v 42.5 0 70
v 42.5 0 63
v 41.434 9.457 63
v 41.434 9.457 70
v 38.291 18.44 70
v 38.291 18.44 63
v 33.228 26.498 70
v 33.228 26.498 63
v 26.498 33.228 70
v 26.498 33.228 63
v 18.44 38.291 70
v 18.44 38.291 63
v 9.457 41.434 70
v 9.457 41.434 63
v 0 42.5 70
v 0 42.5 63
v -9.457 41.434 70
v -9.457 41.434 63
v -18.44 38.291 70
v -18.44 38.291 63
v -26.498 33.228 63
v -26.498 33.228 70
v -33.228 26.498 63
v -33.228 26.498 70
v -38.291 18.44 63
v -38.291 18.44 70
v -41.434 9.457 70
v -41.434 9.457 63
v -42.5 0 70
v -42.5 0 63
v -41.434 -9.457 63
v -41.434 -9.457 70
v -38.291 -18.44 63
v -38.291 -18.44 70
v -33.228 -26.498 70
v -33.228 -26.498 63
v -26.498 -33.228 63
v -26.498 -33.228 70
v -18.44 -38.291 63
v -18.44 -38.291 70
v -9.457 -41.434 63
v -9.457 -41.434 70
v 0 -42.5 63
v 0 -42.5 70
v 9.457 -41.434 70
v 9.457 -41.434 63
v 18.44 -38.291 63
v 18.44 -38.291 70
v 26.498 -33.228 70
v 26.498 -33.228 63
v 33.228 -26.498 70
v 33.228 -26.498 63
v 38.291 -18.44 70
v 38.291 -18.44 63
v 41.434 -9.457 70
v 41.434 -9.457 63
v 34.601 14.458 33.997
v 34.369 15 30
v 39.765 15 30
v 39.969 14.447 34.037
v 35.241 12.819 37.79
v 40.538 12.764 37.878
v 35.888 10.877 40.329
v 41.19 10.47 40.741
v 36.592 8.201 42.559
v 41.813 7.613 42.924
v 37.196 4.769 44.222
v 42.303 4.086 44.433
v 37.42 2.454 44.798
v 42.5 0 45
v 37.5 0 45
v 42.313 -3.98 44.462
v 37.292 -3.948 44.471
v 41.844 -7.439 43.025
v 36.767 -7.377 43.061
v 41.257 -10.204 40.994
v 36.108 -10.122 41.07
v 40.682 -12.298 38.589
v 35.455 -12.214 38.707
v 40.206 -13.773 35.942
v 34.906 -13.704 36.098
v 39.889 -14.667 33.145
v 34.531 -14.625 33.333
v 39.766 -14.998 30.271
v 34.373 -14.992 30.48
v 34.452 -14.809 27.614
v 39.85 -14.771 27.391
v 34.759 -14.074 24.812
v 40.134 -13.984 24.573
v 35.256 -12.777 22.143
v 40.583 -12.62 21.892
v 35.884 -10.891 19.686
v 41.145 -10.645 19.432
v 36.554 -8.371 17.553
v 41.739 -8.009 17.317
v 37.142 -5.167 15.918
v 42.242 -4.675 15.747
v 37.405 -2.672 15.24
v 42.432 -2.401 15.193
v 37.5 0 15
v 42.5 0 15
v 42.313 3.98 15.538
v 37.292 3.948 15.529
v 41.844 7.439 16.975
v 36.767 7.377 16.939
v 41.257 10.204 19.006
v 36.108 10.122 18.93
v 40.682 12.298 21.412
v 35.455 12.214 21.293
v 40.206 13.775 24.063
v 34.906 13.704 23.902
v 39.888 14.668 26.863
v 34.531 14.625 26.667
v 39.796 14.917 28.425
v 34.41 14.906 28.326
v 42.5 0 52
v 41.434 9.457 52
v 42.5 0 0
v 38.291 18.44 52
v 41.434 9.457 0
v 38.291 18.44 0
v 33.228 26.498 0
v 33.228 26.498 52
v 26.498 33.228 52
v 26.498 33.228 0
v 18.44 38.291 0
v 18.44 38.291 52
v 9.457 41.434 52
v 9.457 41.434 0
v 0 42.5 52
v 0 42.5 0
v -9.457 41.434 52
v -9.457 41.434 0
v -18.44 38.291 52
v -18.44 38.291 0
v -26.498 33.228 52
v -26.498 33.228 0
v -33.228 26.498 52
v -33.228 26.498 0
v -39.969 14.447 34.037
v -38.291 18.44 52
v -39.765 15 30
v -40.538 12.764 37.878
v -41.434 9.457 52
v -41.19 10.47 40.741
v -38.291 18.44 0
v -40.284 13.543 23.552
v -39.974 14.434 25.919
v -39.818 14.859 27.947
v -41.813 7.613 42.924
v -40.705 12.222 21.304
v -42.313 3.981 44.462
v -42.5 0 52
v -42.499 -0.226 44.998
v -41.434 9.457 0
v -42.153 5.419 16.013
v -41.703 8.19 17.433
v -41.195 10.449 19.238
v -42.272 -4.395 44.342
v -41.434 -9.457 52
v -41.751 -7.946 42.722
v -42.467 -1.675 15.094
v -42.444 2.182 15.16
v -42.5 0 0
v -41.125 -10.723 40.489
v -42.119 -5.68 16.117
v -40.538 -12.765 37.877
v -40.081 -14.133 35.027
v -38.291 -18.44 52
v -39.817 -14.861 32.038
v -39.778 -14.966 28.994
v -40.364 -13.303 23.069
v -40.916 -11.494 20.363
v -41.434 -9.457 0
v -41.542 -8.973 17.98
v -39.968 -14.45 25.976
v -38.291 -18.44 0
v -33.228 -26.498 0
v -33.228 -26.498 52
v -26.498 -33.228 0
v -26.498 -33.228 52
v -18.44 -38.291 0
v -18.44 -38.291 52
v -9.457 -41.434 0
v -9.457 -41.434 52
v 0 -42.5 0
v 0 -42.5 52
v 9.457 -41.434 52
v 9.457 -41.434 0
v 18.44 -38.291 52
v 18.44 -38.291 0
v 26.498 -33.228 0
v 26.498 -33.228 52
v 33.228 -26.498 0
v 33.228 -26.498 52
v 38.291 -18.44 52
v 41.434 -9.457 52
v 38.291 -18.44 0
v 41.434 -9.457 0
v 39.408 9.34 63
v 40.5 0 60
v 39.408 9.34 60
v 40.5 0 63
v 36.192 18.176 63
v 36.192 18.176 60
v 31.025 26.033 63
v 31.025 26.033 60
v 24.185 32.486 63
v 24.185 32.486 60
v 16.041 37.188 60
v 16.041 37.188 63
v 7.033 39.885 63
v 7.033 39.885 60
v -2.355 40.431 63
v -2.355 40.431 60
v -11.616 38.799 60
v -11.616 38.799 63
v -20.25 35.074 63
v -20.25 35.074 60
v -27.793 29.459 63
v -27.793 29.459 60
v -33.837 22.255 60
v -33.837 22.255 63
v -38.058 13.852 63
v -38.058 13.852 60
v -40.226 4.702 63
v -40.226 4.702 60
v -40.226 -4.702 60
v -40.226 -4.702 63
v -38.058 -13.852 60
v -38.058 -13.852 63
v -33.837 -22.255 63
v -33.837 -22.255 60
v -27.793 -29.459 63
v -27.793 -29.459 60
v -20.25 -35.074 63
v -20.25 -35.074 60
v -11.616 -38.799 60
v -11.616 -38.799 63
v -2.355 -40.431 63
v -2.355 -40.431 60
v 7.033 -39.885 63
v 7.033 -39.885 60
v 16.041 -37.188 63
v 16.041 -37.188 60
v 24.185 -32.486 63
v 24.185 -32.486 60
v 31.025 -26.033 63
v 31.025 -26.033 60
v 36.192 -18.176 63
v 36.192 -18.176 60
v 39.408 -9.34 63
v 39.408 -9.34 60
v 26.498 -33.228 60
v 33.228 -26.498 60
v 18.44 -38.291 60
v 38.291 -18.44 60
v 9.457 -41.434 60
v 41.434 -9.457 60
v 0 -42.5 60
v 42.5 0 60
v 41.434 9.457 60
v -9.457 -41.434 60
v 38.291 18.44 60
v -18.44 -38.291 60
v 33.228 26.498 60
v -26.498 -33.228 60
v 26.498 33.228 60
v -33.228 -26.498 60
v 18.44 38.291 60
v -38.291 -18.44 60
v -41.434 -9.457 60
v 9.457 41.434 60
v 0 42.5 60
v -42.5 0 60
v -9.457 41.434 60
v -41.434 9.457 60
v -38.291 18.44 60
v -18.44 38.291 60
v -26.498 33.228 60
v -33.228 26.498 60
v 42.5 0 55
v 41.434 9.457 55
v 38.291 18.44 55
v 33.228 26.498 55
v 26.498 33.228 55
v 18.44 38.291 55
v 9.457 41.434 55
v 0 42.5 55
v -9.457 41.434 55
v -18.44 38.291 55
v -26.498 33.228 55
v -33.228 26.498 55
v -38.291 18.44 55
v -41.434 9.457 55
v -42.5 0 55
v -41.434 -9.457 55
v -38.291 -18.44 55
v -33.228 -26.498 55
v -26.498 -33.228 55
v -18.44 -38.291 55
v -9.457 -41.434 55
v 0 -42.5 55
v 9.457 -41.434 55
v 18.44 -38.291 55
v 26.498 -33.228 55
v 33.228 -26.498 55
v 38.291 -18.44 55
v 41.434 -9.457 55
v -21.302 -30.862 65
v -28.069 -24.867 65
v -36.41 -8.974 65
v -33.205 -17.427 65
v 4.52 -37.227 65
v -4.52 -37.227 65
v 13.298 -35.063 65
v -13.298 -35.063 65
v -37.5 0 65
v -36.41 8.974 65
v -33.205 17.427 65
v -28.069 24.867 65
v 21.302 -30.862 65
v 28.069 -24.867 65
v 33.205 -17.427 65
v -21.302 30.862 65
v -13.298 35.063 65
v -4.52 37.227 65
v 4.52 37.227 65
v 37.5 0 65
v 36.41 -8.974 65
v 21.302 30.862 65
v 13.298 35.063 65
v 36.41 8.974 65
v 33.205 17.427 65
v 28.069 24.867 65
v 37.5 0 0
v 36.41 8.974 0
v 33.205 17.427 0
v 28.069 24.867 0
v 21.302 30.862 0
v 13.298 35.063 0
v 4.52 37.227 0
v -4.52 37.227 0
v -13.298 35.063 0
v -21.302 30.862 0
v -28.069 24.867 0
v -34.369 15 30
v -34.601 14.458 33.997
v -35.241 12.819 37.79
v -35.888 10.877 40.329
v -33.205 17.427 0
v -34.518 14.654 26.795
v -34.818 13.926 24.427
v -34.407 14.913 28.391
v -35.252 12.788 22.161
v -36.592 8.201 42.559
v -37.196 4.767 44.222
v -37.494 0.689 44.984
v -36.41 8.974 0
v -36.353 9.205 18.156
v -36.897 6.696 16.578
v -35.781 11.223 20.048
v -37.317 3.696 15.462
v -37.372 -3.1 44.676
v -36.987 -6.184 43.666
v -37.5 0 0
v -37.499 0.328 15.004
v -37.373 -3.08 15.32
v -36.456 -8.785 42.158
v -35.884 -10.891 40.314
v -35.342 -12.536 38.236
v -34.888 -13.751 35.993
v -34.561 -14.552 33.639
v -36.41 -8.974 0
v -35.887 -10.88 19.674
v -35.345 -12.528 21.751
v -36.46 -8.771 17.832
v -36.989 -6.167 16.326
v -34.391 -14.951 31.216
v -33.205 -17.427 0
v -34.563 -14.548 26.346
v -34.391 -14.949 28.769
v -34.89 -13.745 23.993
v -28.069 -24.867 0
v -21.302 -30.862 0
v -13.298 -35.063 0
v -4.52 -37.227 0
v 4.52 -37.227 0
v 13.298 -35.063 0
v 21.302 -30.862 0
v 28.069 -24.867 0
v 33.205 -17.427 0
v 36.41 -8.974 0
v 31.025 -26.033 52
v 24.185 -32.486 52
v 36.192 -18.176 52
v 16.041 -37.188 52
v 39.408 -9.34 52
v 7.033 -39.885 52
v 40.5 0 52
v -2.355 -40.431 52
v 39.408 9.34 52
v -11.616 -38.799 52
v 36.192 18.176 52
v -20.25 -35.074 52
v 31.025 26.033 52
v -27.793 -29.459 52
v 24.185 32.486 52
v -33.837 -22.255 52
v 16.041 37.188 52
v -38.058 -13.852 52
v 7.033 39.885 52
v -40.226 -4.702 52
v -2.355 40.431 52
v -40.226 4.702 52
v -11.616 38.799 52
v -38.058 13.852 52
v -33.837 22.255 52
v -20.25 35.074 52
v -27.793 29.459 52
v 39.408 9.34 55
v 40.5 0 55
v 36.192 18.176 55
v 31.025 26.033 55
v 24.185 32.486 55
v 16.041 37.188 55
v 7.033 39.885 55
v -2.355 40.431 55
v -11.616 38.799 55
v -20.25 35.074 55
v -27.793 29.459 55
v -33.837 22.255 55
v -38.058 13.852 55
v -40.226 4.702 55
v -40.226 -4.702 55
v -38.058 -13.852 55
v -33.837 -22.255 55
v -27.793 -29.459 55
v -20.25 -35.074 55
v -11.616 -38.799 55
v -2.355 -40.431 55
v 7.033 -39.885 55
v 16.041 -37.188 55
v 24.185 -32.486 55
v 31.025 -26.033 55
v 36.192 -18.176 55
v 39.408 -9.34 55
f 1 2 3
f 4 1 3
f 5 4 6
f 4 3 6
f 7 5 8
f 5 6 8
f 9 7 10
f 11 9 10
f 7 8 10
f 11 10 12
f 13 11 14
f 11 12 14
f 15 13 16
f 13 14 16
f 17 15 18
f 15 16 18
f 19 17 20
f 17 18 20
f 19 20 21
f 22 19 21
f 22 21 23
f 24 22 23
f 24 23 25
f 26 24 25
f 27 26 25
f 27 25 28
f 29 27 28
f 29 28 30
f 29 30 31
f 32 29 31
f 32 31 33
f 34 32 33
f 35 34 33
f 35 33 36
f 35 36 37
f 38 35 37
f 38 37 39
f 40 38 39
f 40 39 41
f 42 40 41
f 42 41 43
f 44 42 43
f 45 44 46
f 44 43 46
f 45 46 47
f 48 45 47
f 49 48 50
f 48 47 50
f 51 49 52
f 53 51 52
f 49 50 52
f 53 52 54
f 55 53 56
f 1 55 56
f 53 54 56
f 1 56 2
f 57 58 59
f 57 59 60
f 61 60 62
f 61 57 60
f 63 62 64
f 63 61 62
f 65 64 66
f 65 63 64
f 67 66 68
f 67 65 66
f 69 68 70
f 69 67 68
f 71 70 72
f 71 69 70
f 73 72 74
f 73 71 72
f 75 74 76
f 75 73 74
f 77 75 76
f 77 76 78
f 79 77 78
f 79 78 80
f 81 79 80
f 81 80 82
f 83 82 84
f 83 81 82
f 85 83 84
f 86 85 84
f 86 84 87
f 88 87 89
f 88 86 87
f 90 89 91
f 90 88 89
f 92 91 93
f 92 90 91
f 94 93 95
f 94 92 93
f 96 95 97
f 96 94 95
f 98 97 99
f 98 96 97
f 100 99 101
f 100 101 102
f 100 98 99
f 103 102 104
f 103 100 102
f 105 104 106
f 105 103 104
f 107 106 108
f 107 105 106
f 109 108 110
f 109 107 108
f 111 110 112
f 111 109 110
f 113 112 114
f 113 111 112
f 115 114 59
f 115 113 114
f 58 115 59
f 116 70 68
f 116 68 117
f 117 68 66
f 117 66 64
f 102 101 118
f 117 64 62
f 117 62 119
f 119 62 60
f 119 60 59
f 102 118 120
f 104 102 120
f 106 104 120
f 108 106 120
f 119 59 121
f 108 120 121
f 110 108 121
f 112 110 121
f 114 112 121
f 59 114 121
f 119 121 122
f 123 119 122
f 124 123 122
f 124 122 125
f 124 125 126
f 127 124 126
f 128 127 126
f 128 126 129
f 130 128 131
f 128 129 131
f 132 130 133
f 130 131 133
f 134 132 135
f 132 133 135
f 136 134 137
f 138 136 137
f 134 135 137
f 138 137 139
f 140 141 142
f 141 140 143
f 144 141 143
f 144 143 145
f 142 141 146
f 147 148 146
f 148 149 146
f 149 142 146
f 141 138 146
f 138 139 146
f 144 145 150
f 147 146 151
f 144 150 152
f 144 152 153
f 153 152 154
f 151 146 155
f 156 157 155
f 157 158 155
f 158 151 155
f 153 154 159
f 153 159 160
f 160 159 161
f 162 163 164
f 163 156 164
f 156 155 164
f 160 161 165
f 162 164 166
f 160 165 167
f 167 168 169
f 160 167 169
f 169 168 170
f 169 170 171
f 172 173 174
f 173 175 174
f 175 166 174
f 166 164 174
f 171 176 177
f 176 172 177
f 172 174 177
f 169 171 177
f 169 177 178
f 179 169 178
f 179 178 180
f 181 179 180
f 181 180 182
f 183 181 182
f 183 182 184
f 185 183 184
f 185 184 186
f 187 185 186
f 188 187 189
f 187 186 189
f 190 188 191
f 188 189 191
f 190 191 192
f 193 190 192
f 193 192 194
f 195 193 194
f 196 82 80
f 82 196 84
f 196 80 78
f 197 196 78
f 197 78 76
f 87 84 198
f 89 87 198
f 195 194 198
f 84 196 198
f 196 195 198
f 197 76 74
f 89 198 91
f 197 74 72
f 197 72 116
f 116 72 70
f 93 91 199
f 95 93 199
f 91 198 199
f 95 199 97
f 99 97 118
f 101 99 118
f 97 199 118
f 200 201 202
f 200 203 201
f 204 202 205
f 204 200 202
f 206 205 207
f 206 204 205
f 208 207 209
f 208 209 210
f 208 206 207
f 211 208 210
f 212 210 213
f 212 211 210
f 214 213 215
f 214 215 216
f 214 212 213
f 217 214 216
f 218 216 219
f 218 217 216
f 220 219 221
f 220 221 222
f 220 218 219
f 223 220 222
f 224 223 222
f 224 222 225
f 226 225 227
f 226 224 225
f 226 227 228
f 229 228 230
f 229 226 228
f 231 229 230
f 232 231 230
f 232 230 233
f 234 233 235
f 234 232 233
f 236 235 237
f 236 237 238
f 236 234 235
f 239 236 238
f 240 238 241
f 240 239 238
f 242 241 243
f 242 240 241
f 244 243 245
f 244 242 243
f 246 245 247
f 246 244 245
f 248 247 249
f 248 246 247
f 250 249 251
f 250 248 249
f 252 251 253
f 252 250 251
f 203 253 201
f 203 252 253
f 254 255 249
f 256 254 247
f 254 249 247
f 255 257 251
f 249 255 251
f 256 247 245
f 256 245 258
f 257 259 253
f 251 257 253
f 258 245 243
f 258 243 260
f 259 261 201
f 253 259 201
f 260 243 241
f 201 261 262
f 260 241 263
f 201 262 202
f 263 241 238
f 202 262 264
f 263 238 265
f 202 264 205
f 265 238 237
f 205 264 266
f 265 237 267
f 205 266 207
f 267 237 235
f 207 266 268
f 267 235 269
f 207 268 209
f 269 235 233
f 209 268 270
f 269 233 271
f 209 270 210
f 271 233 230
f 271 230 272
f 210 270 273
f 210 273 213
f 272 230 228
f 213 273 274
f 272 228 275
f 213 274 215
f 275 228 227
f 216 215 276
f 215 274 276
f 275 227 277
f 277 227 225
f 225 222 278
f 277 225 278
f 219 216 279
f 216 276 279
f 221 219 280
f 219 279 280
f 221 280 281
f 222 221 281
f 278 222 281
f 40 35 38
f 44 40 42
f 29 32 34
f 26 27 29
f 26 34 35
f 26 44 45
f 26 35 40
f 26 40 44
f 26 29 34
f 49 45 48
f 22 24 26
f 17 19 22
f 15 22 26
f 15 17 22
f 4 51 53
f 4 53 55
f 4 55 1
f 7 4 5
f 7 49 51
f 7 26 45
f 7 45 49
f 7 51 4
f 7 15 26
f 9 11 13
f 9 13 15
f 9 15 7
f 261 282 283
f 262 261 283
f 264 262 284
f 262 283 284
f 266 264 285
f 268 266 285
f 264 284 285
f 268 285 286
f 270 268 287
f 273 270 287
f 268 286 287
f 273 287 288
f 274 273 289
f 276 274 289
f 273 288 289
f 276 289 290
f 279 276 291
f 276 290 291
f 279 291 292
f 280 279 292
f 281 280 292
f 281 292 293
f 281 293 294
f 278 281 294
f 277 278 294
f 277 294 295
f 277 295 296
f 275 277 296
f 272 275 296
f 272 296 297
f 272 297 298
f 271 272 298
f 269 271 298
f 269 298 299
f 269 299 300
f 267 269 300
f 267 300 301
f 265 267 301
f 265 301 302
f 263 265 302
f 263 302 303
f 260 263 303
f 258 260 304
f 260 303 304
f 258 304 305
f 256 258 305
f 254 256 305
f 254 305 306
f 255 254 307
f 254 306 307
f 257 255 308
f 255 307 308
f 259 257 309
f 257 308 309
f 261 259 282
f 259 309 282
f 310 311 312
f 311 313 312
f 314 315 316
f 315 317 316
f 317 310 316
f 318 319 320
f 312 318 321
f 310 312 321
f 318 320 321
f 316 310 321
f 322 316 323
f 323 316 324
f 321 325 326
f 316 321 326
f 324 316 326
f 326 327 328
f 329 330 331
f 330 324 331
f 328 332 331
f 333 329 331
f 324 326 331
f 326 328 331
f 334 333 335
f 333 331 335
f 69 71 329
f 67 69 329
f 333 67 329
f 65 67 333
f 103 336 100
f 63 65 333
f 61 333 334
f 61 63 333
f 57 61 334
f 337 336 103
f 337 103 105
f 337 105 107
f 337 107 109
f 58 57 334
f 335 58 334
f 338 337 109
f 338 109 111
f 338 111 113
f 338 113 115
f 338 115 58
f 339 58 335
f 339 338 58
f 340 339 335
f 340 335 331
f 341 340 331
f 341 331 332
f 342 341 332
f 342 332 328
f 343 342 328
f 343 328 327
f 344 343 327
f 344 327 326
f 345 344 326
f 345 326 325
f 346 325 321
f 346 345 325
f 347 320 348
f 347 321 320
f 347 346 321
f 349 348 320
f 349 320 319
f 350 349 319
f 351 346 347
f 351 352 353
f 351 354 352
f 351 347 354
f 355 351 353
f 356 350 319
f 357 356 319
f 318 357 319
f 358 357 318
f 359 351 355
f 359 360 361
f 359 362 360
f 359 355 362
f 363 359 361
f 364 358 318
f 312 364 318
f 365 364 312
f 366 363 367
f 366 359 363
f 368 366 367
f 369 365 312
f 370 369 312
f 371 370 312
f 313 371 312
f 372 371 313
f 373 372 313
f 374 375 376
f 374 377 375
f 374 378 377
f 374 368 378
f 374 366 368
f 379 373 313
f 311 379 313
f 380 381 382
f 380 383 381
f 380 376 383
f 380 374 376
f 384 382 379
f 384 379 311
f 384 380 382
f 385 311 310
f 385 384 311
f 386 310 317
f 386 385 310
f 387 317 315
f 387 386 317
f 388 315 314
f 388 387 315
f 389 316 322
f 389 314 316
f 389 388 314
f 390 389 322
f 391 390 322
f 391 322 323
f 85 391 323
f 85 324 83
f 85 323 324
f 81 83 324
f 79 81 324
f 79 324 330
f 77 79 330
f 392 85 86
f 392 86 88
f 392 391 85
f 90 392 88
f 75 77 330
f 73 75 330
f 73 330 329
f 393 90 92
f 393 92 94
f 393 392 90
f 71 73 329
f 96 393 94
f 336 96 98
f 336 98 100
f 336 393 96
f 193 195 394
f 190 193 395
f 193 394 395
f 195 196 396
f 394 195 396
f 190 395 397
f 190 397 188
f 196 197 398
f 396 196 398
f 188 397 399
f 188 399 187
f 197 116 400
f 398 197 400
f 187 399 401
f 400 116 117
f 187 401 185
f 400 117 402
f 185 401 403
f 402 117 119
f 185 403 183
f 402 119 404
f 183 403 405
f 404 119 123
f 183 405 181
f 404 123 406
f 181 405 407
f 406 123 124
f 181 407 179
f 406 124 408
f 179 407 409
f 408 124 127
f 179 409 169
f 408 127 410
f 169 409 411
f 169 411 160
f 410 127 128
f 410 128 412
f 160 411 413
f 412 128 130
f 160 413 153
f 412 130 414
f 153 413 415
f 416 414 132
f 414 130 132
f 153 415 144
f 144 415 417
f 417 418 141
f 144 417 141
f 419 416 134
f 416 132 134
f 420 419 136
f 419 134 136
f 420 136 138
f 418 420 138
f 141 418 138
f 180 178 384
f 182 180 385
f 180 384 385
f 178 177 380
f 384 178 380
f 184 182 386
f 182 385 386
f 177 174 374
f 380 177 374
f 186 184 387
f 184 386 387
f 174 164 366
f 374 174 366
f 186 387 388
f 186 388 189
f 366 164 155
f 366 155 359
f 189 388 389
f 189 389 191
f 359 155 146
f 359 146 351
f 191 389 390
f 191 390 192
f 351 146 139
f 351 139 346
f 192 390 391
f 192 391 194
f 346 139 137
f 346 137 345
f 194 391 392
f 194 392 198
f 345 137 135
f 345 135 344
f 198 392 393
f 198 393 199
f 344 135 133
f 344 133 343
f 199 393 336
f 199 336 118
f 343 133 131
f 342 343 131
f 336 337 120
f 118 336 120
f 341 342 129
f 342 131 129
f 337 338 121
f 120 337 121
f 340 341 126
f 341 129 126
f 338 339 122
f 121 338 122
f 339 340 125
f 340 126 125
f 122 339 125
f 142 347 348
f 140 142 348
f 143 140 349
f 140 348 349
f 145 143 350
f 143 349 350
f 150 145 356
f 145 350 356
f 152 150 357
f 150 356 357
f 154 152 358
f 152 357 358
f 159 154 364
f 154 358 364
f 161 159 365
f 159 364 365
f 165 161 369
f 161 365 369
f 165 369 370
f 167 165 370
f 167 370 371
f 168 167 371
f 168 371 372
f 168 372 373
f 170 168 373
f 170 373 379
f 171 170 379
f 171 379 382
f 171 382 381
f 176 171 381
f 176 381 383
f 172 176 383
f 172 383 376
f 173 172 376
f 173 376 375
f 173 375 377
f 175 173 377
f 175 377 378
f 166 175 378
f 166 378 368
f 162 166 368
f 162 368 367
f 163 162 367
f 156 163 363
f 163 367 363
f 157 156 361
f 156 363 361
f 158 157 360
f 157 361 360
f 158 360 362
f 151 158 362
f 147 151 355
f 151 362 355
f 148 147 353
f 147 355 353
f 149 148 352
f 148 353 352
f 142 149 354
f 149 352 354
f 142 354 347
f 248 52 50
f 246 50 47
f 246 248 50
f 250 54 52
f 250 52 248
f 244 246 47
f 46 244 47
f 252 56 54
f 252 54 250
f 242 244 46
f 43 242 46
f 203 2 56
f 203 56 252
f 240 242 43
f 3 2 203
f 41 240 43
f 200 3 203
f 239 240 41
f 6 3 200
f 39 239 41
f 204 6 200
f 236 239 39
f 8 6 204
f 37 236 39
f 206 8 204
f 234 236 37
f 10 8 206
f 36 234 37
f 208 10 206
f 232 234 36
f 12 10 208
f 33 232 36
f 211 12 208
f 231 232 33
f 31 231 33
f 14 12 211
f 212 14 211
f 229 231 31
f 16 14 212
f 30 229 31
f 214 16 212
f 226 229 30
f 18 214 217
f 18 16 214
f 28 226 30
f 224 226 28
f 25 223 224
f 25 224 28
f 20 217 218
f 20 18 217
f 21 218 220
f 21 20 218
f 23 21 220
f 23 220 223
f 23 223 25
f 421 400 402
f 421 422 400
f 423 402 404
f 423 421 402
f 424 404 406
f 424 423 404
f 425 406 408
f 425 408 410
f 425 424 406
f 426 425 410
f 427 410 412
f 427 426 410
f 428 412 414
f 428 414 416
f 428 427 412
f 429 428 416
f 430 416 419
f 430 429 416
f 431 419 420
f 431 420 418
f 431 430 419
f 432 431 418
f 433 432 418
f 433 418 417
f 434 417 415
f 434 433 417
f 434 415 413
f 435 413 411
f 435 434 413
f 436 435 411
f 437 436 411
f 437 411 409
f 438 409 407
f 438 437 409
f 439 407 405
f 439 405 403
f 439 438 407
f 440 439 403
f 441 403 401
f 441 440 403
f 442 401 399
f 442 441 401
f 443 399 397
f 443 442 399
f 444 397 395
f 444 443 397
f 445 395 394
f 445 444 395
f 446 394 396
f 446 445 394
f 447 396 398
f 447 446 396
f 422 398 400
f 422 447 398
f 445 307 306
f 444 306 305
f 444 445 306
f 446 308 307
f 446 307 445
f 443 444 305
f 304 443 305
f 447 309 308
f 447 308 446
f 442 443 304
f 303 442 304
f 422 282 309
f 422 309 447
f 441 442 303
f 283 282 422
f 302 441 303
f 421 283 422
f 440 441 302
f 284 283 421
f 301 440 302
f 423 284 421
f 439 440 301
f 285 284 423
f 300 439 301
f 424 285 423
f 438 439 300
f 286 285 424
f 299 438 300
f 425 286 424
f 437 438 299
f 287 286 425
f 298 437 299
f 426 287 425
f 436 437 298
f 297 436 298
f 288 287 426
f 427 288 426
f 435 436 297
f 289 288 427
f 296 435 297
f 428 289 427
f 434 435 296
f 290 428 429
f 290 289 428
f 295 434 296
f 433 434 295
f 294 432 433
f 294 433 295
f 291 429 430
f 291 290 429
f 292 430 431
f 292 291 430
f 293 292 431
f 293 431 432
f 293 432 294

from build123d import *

# Parameters (mm, degrees)
SKETCH_R          = 42.5
PAD_DEPTH         = 70
THICKNESS_T       = -5
SKETCH001_R       = 15
POCKET_DEPTH      = 50
POCKET_DEPTH_BACK = -50
SKETCH002_W       = 2
SKETCH002_H       = 3


with BuildPart() as part:
    # Sketch → Pad (new body)
    with BuildSketch(Plane.XY):
        Circle(SKETCH_R)
    extrude(amount=PAD_DEPTH)

    # Thickness
    thickness_openings = [part.faces().sort_by_distance(p)[0] for p in [
        (0, 0, 0),
    ]]
    offset(amount=THICKNESS_T, openings=thickness_openings)

    # Sketch001 → Pocket (cut, two sides)
    with BuildSketch(Plane.YZ) as pocket_sk:
        with Locations((0, 30)):
            Circle(SKETCH001_R)
    extrude(amount=-POCKET_DEPTH, mode=Mode.SUBTRACT)
    extrude(pocket_sk.sketch, amount=-POCKET_DEPTH_BACK, mode=Mode.SUBTRACT)

    # Sketch002 → Groove (revolve, cut)
    with BuildSketch(Plane.XZ):
        with Locations((41.5, 61.5)):
            Rectangle(SKETCH002_W, SKETCH002_H)
        with Locations((41.5, 53.5)):
            Rectangle(SKETCH002_W, SKETCH002_H)
    revolve(axis=Axis((0, 0, 0), (0, 0, 1)), mode=Mode.SUBTRACT)


solid = part.part
